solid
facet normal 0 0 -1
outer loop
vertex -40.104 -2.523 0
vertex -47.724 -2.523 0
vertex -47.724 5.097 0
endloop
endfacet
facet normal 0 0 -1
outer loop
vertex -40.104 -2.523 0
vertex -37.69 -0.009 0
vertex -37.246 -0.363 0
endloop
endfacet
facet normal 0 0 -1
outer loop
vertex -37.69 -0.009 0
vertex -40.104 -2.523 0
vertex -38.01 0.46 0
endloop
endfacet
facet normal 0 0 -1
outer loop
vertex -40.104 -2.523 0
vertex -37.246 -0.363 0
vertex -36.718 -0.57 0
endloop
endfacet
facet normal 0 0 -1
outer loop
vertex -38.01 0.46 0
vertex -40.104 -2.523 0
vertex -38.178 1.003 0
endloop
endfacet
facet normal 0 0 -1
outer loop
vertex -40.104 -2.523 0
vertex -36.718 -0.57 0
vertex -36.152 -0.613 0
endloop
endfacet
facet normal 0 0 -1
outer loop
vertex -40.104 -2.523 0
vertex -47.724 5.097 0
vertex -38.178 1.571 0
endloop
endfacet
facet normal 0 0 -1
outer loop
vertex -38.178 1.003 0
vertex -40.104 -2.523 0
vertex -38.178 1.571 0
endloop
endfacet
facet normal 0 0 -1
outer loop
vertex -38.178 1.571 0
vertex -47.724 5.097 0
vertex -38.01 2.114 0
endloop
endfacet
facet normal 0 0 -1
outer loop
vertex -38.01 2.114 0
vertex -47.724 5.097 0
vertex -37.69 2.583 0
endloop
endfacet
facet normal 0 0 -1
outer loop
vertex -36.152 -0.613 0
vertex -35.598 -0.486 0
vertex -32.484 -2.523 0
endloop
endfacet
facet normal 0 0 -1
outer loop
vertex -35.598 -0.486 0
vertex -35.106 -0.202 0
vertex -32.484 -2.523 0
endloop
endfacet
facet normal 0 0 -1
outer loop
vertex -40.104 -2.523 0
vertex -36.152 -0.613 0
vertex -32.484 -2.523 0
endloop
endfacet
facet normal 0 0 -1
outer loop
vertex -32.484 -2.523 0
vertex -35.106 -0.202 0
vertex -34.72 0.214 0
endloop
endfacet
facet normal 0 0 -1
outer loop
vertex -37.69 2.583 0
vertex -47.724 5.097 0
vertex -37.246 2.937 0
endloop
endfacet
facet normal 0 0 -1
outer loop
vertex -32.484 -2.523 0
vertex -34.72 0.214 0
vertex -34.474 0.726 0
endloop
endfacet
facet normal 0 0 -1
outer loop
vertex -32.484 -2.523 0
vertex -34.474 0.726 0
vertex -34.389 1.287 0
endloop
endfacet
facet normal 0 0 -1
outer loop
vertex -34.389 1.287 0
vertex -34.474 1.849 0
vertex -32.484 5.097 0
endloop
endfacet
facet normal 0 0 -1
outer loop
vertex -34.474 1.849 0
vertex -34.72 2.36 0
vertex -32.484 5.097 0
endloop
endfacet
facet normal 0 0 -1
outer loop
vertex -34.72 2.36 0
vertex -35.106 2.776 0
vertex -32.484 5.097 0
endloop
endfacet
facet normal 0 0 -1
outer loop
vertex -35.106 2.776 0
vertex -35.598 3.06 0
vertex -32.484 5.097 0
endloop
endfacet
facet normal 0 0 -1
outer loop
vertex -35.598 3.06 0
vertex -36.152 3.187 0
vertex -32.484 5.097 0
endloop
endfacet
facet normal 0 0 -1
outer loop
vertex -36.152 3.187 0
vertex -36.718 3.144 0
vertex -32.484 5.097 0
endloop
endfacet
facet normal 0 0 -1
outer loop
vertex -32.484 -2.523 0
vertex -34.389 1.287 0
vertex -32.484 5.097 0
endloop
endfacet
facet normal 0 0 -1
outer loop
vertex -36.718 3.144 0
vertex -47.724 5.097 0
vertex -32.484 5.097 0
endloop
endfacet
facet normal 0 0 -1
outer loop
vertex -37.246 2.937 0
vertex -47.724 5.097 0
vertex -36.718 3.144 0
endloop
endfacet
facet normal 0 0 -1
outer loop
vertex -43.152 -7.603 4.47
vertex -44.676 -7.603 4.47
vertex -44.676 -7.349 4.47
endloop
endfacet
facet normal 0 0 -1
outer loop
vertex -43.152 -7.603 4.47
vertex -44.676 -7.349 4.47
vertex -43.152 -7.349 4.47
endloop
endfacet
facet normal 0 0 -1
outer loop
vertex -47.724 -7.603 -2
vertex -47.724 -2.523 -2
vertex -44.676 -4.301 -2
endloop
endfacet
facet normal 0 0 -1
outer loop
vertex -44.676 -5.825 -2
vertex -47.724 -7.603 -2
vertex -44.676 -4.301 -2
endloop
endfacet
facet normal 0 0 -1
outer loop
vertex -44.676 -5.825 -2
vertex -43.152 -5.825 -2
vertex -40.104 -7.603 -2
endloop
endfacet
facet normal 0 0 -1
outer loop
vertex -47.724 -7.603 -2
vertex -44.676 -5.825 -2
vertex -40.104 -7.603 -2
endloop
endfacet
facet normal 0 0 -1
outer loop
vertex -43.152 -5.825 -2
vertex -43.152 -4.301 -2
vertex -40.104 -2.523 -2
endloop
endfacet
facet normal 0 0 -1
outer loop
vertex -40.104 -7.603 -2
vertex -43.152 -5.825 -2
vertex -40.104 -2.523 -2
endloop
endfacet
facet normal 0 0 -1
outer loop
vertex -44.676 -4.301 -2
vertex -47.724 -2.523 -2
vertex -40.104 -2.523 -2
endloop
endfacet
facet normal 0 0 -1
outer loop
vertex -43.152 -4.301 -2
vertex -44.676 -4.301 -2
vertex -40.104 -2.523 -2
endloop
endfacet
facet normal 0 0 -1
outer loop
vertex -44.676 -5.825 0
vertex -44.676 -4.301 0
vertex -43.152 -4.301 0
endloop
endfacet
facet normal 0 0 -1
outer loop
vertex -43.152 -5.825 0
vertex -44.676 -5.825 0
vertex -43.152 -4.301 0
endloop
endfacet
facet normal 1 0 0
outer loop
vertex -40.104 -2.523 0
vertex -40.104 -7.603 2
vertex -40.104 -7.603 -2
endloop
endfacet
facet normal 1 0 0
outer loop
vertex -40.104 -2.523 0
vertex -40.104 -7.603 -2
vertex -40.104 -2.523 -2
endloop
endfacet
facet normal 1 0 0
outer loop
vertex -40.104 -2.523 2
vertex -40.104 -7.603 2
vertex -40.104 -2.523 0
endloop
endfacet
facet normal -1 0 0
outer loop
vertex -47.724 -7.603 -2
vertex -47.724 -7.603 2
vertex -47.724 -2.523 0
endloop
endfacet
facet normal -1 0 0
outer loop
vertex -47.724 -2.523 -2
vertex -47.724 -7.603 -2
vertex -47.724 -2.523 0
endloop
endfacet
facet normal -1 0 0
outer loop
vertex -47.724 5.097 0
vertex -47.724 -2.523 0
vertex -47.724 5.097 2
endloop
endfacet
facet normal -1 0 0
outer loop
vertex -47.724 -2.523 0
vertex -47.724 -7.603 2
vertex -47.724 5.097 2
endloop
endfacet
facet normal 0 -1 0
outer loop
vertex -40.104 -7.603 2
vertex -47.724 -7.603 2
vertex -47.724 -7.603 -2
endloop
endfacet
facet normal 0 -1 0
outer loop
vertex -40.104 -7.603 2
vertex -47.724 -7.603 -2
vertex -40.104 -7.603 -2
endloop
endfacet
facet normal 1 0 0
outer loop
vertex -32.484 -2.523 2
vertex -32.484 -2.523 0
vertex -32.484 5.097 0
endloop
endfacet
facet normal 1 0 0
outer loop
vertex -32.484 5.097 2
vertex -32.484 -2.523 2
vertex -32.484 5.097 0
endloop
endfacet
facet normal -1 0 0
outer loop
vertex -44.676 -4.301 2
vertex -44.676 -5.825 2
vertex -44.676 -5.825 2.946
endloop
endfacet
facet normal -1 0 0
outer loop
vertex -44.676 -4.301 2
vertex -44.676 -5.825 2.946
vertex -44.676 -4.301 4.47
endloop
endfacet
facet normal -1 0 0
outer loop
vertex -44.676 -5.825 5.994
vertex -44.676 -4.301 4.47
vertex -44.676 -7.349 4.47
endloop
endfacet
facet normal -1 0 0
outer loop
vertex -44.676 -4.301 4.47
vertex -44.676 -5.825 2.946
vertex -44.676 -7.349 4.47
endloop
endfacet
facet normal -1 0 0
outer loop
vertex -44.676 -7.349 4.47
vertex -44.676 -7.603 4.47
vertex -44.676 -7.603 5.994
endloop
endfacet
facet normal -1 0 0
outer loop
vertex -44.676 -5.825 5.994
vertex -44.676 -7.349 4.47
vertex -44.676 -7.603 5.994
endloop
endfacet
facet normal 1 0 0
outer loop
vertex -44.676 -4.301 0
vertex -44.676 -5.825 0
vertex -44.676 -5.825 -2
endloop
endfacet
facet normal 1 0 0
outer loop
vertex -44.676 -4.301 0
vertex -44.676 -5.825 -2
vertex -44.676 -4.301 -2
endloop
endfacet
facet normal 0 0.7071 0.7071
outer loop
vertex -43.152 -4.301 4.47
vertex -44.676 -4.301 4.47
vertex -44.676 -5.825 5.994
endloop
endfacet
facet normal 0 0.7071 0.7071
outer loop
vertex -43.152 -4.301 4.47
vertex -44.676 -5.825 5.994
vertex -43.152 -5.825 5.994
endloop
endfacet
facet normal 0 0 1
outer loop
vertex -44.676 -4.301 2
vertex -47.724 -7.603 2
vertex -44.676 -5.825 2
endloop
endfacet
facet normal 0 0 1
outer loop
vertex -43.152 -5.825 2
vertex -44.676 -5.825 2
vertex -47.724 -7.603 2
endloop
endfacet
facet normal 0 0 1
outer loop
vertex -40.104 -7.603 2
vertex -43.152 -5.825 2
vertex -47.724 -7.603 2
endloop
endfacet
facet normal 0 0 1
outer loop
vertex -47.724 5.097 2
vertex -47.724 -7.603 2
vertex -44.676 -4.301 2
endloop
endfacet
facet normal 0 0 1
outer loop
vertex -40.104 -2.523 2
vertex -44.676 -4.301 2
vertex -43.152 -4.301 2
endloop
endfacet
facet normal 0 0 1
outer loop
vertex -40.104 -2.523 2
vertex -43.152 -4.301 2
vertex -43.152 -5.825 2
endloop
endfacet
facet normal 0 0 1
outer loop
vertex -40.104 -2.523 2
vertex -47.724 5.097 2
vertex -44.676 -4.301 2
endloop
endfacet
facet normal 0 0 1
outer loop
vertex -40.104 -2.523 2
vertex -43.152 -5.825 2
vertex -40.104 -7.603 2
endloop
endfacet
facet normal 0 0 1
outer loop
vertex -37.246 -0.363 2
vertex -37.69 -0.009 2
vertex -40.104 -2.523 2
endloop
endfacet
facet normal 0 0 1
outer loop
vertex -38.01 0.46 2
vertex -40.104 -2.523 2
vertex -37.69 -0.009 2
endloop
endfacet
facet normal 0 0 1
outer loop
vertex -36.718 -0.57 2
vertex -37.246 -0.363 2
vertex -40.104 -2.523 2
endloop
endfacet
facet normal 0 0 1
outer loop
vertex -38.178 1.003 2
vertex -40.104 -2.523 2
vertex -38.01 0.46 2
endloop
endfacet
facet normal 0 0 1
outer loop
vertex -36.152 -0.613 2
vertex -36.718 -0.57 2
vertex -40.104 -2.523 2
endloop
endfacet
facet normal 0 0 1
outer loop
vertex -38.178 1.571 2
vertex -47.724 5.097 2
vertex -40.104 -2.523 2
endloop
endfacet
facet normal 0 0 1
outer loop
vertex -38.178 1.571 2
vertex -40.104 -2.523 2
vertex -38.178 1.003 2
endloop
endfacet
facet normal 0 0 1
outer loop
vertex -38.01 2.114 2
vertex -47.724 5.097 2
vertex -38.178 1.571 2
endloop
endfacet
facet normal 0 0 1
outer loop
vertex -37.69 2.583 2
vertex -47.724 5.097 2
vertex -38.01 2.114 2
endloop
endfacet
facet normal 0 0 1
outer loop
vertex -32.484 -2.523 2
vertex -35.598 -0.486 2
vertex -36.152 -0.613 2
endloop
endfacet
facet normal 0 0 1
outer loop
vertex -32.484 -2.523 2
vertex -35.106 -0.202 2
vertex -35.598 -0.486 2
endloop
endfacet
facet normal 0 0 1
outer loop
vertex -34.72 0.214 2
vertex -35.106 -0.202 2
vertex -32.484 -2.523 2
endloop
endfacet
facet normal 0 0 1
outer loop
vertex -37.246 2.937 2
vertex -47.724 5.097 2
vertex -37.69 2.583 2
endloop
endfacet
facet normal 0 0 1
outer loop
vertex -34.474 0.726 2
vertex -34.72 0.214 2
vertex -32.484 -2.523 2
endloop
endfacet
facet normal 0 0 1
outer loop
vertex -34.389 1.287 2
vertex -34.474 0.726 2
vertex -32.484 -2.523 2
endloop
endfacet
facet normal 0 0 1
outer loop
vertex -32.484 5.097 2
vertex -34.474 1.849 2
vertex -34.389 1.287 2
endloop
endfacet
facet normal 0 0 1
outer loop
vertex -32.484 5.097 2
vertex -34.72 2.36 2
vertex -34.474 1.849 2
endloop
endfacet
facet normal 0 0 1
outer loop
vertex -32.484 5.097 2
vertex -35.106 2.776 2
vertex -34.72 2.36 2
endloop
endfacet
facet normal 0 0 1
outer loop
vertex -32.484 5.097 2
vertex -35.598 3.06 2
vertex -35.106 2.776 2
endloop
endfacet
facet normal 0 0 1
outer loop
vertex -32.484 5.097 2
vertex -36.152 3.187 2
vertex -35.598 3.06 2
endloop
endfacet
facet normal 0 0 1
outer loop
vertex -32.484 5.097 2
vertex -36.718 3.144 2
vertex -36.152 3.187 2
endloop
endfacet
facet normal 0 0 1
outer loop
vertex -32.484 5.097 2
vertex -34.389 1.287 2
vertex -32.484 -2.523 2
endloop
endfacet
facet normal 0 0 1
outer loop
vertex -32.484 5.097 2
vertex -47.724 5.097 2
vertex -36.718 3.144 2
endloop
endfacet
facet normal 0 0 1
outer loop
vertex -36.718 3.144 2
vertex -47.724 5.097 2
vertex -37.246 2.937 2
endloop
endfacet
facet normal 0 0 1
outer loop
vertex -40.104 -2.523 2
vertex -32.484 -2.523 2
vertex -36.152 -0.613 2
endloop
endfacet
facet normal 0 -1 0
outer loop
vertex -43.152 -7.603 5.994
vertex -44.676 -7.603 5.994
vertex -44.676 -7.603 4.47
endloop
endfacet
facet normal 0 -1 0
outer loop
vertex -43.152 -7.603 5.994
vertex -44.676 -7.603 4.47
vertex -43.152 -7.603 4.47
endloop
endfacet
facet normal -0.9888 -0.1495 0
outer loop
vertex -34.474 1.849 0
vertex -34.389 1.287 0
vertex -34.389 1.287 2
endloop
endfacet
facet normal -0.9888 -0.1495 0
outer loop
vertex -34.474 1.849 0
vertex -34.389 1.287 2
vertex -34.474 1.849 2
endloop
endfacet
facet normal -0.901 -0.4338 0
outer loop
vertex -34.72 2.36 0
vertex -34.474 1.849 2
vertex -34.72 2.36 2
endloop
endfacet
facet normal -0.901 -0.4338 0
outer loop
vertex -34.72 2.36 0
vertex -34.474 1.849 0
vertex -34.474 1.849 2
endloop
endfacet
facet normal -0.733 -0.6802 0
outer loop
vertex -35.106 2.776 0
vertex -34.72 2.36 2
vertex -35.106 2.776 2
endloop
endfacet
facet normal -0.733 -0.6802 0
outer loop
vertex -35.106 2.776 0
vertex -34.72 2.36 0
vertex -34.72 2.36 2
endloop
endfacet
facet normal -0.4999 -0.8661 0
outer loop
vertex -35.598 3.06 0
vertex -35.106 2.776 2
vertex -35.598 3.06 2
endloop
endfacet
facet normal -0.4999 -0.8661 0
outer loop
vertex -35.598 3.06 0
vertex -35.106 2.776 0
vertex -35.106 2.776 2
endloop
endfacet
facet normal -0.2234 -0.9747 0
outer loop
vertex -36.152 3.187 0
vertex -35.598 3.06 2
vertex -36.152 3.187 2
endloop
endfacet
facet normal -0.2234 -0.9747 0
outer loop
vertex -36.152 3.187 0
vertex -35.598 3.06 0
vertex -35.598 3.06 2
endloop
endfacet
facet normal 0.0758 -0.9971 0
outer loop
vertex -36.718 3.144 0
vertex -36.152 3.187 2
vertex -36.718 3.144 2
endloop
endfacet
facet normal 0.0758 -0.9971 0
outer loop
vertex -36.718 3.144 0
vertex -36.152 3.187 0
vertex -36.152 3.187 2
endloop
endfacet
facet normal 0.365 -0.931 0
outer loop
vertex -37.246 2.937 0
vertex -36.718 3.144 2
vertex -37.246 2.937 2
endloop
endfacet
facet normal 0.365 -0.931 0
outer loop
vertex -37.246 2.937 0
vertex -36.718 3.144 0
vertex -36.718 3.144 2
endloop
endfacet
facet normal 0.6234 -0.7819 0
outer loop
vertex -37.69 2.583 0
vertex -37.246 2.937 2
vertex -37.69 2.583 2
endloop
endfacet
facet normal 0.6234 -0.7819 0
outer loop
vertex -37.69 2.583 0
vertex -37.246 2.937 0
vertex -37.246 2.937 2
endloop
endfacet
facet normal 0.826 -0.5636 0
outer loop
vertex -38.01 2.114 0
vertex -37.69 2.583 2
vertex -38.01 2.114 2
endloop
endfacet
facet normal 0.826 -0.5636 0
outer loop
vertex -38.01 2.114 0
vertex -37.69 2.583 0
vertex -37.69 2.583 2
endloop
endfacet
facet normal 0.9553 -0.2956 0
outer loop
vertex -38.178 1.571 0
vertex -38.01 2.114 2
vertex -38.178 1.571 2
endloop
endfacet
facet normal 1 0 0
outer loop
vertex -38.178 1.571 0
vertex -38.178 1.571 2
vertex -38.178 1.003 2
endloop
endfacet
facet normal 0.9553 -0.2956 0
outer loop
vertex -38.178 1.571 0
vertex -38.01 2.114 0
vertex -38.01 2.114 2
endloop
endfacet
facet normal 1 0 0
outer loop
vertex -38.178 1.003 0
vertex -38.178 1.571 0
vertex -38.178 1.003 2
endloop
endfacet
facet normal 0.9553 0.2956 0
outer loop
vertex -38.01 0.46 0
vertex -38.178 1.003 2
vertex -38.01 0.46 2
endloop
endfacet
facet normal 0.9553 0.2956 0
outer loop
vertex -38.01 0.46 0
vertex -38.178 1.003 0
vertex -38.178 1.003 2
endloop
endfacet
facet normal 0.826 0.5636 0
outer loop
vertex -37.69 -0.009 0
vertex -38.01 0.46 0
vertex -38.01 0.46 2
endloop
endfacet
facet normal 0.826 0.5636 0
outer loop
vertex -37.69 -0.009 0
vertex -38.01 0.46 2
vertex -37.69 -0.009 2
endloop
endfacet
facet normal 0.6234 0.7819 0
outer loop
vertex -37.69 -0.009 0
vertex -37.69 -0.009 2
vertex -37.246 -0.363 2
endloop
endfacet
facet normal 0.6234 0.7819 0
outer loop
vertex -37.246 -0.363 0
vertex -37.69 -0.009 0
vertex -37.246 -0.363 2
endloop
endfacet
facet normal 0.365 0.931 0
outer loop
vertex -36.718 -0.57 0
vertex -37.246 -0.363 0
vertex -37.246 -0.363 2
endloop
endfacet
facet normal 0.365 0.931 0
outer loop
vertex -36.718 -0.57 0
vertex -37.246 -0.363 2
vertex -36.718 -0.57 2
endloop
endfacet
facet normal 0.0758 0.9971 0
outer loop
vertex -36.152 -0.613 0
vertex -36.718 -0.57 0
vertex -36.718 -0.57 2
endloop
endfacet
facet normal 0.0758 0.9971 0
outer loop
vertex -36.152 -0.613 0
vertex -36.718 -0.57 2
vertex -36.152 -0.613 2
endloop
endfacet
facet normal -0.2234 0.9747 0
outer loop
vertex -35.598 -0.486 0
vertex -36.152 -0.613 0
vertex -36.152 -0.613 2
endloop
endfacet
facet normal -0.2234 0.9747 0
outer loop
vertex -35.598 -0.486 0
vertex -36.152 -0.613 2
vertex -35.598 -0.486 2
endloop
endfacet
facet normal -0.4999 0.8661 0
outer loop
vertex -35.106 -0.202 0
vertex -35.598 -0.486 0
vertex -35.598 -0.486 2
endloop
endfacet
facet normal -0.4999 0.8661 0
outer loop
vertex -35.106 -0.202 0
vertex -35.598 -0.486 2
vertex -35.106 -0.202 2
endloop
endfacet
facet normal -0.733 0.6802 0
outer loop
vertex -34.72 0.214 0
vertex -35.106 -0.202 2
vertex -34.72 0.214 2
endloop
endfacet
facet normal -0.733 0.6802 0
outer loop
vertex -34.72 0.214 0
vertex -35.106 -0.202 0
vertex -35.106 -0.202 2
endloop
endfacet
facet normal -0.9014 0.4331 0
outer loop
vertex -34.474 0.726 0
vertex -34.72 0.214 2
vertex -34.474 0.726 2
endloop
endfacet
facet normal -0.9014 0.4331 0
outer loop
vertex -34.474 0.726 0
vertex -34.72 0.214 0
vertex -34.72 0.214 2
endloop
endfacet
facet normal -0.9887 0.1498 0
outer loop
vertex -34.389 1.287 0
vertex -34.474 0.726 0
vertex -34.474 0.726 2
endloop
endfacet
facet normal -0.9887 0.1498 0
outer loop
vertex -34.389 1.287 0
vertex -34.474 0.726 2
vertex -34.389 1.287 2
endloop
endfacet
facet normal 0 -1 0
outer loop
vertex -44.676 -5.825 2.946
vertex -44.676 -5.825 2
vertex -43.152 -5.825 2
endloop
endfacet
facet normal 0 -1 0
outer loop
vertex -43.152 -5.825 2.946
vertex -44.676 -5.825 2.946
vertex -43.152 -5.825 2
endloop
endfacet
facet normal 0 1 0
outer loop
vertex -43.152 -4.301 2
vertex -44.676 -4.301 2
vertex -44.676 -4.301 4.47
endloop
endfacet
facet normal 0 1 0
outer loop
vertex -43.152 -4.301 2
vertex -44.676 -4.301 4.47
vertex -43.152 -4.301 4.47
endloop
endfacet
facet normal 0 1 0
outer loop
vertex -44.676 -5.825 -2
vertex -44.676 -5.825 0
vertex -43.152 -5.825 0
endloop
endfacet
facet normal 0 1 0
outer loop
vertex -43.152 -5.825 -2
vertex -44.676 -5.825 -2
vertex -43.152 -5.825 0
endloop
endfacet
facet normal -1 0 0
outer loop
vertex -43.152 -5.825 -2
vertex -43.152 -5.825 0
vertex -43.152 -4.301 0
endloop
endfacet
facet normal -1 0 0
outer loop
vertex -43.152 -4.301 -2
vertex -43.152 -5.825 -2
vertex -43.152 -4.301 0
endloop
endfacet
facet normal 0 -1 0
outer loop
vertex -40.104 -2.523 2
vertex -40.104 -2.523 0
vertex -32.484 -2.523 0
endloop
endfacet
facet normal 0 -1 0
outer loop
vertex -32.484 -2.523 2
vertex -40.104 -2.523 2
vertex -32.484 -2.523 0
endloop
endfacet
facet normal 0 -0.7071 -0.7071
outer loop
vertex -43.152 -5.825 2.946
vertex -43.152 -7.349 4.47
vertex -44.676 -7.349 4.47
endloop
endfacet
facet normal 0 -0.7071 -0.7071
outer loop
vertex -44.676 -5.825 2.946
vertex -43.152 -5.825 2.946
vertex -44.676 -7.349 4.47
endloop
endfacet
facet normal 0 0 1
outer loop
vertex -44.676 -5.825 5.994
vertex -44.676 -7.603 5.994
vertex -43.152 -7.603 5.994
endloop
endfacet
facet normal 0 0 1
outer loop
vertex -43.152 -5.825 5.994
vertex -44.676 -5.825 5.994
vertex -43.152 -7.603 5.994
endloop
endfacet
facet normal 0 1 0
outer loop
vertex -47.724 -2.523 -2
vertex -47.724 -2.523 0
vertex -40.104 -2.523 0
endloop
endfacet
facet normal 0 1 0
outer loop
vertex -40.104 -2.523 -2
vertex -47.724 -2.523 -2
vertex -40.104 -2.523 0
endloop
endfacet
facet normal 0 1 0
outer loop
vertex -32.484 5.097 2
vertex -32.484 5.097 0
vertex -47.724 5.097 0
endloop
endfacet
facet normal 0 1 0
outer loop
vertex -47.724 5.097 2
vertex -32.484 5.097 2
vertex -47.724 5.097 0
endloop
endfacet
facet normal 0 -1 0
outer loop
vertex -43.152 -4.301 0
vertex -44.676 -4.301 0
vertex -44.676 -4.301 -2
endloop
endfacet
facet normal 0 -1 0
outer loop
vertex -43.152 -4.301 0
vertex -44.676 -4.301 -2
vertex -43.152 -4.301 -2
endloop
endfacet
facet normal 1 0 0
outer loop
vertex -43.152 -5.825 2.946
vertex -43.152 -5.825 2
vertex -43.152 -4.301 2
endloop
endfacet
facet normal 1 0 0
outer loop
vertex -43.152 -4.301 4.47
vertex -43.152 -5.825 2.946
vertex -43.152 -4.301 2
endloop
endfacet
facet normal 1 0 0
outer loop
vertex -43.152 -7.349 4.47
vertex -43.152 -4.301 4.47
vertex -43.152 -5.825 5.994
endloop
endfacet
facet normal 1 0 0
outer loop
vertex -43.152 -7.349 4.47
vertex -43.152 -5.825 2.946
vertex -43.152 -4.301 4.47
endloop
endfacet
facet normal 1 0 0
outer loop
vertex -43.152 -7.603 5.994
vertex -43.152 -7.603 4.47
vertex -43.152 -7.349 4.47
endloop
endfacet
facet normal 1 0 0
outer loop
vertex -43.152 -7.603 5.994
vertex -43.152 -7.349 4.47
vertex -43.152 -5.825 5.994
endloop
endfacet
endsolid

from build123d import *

# Parameters (mm, degrees)
F0_R     = 1.905
F0_W     = 7.62
F0_H     = 5.08
F0_W_2   = 1.524
F0_H_2   = 1.524
F1_DEPTH = 2
F2_DEPTH = 2
F3_DEPTH = 5.9944
F4_W     = 1.524
F4_H     = 1.524
F5_DEPTH = 2.4638
F6_SIZE  = 1.524


# Not quite as in the source:
# - a feature names something its author has since deleted; it is built from what else it names


with BuildPart() as f1:
    # F0 (on Top) → F1 (new body)
    with BuildSketch(Plane.XY):
        Polygon((-32.4838893509, -2.5229738411), (-32.4838893509, 5.0970261589), (-47.7238893509, 5.0970261589), (-47.7238893509, -2.5229738411), (-40.1038893509, -2.5229738411), align=None)
        with Locations((-36.2938893509, 1.2870261589)):
            Circle(F0_R, mode=Mode.SUBTRACT)
        with Locations((-43.9138893509, -5.0629738411)):
            Rectangle(F0_W, F0_H)
        with Locations((-43.9138893509, -5.0629738411)):
            Rectangle(F0_W_2, F0_H_2, mode=Mode.SUBTRACT)
    extrude(amount=F1_DEPTH)

    # F0 (on Top) → F2 (join)
    with BuildSketch(Plane.XY):
        with Locations((-43.9138893509, -5.0629738411)):
            Rectangle(F0_W, F0_H)
        with Locations((-43.9138893509, -5.0629738411)):
            Rectangle(F0_W_2, F0_H_2, mode=Mode.SUBTRACT)
    extrude(amount=-F2_DEPTH)

    # F0 (on Top) → F3 (join)
    with BuildSketch(Plane.XY):
        with Locations((-43.9138893509, -5.0629738411)):
            Rectangle(F0_W_2, F0_H_2)
    extrude(amount=F3_DEPTH)

    # F4 (on face) → F5 (join)
    with BuildSketch(Plane.XZ.offset(7.6029738411)):
        with Locations((-43.9138893509, 5.2324)):
            Rectangle(F4_W, F4_H)
    extrude(amount=-F5_DEPTH)

    # F6
    f6_edges = [f1.edges().sort_by_distance(p)[0] for p in [
        (-43.913889, -5.824974, 4.4704),
        (-43.913889, -4.300974, 5.9944),
    ]]
    chamfer(f6_edges, length=F6_SIZE)


solid = f1.part
